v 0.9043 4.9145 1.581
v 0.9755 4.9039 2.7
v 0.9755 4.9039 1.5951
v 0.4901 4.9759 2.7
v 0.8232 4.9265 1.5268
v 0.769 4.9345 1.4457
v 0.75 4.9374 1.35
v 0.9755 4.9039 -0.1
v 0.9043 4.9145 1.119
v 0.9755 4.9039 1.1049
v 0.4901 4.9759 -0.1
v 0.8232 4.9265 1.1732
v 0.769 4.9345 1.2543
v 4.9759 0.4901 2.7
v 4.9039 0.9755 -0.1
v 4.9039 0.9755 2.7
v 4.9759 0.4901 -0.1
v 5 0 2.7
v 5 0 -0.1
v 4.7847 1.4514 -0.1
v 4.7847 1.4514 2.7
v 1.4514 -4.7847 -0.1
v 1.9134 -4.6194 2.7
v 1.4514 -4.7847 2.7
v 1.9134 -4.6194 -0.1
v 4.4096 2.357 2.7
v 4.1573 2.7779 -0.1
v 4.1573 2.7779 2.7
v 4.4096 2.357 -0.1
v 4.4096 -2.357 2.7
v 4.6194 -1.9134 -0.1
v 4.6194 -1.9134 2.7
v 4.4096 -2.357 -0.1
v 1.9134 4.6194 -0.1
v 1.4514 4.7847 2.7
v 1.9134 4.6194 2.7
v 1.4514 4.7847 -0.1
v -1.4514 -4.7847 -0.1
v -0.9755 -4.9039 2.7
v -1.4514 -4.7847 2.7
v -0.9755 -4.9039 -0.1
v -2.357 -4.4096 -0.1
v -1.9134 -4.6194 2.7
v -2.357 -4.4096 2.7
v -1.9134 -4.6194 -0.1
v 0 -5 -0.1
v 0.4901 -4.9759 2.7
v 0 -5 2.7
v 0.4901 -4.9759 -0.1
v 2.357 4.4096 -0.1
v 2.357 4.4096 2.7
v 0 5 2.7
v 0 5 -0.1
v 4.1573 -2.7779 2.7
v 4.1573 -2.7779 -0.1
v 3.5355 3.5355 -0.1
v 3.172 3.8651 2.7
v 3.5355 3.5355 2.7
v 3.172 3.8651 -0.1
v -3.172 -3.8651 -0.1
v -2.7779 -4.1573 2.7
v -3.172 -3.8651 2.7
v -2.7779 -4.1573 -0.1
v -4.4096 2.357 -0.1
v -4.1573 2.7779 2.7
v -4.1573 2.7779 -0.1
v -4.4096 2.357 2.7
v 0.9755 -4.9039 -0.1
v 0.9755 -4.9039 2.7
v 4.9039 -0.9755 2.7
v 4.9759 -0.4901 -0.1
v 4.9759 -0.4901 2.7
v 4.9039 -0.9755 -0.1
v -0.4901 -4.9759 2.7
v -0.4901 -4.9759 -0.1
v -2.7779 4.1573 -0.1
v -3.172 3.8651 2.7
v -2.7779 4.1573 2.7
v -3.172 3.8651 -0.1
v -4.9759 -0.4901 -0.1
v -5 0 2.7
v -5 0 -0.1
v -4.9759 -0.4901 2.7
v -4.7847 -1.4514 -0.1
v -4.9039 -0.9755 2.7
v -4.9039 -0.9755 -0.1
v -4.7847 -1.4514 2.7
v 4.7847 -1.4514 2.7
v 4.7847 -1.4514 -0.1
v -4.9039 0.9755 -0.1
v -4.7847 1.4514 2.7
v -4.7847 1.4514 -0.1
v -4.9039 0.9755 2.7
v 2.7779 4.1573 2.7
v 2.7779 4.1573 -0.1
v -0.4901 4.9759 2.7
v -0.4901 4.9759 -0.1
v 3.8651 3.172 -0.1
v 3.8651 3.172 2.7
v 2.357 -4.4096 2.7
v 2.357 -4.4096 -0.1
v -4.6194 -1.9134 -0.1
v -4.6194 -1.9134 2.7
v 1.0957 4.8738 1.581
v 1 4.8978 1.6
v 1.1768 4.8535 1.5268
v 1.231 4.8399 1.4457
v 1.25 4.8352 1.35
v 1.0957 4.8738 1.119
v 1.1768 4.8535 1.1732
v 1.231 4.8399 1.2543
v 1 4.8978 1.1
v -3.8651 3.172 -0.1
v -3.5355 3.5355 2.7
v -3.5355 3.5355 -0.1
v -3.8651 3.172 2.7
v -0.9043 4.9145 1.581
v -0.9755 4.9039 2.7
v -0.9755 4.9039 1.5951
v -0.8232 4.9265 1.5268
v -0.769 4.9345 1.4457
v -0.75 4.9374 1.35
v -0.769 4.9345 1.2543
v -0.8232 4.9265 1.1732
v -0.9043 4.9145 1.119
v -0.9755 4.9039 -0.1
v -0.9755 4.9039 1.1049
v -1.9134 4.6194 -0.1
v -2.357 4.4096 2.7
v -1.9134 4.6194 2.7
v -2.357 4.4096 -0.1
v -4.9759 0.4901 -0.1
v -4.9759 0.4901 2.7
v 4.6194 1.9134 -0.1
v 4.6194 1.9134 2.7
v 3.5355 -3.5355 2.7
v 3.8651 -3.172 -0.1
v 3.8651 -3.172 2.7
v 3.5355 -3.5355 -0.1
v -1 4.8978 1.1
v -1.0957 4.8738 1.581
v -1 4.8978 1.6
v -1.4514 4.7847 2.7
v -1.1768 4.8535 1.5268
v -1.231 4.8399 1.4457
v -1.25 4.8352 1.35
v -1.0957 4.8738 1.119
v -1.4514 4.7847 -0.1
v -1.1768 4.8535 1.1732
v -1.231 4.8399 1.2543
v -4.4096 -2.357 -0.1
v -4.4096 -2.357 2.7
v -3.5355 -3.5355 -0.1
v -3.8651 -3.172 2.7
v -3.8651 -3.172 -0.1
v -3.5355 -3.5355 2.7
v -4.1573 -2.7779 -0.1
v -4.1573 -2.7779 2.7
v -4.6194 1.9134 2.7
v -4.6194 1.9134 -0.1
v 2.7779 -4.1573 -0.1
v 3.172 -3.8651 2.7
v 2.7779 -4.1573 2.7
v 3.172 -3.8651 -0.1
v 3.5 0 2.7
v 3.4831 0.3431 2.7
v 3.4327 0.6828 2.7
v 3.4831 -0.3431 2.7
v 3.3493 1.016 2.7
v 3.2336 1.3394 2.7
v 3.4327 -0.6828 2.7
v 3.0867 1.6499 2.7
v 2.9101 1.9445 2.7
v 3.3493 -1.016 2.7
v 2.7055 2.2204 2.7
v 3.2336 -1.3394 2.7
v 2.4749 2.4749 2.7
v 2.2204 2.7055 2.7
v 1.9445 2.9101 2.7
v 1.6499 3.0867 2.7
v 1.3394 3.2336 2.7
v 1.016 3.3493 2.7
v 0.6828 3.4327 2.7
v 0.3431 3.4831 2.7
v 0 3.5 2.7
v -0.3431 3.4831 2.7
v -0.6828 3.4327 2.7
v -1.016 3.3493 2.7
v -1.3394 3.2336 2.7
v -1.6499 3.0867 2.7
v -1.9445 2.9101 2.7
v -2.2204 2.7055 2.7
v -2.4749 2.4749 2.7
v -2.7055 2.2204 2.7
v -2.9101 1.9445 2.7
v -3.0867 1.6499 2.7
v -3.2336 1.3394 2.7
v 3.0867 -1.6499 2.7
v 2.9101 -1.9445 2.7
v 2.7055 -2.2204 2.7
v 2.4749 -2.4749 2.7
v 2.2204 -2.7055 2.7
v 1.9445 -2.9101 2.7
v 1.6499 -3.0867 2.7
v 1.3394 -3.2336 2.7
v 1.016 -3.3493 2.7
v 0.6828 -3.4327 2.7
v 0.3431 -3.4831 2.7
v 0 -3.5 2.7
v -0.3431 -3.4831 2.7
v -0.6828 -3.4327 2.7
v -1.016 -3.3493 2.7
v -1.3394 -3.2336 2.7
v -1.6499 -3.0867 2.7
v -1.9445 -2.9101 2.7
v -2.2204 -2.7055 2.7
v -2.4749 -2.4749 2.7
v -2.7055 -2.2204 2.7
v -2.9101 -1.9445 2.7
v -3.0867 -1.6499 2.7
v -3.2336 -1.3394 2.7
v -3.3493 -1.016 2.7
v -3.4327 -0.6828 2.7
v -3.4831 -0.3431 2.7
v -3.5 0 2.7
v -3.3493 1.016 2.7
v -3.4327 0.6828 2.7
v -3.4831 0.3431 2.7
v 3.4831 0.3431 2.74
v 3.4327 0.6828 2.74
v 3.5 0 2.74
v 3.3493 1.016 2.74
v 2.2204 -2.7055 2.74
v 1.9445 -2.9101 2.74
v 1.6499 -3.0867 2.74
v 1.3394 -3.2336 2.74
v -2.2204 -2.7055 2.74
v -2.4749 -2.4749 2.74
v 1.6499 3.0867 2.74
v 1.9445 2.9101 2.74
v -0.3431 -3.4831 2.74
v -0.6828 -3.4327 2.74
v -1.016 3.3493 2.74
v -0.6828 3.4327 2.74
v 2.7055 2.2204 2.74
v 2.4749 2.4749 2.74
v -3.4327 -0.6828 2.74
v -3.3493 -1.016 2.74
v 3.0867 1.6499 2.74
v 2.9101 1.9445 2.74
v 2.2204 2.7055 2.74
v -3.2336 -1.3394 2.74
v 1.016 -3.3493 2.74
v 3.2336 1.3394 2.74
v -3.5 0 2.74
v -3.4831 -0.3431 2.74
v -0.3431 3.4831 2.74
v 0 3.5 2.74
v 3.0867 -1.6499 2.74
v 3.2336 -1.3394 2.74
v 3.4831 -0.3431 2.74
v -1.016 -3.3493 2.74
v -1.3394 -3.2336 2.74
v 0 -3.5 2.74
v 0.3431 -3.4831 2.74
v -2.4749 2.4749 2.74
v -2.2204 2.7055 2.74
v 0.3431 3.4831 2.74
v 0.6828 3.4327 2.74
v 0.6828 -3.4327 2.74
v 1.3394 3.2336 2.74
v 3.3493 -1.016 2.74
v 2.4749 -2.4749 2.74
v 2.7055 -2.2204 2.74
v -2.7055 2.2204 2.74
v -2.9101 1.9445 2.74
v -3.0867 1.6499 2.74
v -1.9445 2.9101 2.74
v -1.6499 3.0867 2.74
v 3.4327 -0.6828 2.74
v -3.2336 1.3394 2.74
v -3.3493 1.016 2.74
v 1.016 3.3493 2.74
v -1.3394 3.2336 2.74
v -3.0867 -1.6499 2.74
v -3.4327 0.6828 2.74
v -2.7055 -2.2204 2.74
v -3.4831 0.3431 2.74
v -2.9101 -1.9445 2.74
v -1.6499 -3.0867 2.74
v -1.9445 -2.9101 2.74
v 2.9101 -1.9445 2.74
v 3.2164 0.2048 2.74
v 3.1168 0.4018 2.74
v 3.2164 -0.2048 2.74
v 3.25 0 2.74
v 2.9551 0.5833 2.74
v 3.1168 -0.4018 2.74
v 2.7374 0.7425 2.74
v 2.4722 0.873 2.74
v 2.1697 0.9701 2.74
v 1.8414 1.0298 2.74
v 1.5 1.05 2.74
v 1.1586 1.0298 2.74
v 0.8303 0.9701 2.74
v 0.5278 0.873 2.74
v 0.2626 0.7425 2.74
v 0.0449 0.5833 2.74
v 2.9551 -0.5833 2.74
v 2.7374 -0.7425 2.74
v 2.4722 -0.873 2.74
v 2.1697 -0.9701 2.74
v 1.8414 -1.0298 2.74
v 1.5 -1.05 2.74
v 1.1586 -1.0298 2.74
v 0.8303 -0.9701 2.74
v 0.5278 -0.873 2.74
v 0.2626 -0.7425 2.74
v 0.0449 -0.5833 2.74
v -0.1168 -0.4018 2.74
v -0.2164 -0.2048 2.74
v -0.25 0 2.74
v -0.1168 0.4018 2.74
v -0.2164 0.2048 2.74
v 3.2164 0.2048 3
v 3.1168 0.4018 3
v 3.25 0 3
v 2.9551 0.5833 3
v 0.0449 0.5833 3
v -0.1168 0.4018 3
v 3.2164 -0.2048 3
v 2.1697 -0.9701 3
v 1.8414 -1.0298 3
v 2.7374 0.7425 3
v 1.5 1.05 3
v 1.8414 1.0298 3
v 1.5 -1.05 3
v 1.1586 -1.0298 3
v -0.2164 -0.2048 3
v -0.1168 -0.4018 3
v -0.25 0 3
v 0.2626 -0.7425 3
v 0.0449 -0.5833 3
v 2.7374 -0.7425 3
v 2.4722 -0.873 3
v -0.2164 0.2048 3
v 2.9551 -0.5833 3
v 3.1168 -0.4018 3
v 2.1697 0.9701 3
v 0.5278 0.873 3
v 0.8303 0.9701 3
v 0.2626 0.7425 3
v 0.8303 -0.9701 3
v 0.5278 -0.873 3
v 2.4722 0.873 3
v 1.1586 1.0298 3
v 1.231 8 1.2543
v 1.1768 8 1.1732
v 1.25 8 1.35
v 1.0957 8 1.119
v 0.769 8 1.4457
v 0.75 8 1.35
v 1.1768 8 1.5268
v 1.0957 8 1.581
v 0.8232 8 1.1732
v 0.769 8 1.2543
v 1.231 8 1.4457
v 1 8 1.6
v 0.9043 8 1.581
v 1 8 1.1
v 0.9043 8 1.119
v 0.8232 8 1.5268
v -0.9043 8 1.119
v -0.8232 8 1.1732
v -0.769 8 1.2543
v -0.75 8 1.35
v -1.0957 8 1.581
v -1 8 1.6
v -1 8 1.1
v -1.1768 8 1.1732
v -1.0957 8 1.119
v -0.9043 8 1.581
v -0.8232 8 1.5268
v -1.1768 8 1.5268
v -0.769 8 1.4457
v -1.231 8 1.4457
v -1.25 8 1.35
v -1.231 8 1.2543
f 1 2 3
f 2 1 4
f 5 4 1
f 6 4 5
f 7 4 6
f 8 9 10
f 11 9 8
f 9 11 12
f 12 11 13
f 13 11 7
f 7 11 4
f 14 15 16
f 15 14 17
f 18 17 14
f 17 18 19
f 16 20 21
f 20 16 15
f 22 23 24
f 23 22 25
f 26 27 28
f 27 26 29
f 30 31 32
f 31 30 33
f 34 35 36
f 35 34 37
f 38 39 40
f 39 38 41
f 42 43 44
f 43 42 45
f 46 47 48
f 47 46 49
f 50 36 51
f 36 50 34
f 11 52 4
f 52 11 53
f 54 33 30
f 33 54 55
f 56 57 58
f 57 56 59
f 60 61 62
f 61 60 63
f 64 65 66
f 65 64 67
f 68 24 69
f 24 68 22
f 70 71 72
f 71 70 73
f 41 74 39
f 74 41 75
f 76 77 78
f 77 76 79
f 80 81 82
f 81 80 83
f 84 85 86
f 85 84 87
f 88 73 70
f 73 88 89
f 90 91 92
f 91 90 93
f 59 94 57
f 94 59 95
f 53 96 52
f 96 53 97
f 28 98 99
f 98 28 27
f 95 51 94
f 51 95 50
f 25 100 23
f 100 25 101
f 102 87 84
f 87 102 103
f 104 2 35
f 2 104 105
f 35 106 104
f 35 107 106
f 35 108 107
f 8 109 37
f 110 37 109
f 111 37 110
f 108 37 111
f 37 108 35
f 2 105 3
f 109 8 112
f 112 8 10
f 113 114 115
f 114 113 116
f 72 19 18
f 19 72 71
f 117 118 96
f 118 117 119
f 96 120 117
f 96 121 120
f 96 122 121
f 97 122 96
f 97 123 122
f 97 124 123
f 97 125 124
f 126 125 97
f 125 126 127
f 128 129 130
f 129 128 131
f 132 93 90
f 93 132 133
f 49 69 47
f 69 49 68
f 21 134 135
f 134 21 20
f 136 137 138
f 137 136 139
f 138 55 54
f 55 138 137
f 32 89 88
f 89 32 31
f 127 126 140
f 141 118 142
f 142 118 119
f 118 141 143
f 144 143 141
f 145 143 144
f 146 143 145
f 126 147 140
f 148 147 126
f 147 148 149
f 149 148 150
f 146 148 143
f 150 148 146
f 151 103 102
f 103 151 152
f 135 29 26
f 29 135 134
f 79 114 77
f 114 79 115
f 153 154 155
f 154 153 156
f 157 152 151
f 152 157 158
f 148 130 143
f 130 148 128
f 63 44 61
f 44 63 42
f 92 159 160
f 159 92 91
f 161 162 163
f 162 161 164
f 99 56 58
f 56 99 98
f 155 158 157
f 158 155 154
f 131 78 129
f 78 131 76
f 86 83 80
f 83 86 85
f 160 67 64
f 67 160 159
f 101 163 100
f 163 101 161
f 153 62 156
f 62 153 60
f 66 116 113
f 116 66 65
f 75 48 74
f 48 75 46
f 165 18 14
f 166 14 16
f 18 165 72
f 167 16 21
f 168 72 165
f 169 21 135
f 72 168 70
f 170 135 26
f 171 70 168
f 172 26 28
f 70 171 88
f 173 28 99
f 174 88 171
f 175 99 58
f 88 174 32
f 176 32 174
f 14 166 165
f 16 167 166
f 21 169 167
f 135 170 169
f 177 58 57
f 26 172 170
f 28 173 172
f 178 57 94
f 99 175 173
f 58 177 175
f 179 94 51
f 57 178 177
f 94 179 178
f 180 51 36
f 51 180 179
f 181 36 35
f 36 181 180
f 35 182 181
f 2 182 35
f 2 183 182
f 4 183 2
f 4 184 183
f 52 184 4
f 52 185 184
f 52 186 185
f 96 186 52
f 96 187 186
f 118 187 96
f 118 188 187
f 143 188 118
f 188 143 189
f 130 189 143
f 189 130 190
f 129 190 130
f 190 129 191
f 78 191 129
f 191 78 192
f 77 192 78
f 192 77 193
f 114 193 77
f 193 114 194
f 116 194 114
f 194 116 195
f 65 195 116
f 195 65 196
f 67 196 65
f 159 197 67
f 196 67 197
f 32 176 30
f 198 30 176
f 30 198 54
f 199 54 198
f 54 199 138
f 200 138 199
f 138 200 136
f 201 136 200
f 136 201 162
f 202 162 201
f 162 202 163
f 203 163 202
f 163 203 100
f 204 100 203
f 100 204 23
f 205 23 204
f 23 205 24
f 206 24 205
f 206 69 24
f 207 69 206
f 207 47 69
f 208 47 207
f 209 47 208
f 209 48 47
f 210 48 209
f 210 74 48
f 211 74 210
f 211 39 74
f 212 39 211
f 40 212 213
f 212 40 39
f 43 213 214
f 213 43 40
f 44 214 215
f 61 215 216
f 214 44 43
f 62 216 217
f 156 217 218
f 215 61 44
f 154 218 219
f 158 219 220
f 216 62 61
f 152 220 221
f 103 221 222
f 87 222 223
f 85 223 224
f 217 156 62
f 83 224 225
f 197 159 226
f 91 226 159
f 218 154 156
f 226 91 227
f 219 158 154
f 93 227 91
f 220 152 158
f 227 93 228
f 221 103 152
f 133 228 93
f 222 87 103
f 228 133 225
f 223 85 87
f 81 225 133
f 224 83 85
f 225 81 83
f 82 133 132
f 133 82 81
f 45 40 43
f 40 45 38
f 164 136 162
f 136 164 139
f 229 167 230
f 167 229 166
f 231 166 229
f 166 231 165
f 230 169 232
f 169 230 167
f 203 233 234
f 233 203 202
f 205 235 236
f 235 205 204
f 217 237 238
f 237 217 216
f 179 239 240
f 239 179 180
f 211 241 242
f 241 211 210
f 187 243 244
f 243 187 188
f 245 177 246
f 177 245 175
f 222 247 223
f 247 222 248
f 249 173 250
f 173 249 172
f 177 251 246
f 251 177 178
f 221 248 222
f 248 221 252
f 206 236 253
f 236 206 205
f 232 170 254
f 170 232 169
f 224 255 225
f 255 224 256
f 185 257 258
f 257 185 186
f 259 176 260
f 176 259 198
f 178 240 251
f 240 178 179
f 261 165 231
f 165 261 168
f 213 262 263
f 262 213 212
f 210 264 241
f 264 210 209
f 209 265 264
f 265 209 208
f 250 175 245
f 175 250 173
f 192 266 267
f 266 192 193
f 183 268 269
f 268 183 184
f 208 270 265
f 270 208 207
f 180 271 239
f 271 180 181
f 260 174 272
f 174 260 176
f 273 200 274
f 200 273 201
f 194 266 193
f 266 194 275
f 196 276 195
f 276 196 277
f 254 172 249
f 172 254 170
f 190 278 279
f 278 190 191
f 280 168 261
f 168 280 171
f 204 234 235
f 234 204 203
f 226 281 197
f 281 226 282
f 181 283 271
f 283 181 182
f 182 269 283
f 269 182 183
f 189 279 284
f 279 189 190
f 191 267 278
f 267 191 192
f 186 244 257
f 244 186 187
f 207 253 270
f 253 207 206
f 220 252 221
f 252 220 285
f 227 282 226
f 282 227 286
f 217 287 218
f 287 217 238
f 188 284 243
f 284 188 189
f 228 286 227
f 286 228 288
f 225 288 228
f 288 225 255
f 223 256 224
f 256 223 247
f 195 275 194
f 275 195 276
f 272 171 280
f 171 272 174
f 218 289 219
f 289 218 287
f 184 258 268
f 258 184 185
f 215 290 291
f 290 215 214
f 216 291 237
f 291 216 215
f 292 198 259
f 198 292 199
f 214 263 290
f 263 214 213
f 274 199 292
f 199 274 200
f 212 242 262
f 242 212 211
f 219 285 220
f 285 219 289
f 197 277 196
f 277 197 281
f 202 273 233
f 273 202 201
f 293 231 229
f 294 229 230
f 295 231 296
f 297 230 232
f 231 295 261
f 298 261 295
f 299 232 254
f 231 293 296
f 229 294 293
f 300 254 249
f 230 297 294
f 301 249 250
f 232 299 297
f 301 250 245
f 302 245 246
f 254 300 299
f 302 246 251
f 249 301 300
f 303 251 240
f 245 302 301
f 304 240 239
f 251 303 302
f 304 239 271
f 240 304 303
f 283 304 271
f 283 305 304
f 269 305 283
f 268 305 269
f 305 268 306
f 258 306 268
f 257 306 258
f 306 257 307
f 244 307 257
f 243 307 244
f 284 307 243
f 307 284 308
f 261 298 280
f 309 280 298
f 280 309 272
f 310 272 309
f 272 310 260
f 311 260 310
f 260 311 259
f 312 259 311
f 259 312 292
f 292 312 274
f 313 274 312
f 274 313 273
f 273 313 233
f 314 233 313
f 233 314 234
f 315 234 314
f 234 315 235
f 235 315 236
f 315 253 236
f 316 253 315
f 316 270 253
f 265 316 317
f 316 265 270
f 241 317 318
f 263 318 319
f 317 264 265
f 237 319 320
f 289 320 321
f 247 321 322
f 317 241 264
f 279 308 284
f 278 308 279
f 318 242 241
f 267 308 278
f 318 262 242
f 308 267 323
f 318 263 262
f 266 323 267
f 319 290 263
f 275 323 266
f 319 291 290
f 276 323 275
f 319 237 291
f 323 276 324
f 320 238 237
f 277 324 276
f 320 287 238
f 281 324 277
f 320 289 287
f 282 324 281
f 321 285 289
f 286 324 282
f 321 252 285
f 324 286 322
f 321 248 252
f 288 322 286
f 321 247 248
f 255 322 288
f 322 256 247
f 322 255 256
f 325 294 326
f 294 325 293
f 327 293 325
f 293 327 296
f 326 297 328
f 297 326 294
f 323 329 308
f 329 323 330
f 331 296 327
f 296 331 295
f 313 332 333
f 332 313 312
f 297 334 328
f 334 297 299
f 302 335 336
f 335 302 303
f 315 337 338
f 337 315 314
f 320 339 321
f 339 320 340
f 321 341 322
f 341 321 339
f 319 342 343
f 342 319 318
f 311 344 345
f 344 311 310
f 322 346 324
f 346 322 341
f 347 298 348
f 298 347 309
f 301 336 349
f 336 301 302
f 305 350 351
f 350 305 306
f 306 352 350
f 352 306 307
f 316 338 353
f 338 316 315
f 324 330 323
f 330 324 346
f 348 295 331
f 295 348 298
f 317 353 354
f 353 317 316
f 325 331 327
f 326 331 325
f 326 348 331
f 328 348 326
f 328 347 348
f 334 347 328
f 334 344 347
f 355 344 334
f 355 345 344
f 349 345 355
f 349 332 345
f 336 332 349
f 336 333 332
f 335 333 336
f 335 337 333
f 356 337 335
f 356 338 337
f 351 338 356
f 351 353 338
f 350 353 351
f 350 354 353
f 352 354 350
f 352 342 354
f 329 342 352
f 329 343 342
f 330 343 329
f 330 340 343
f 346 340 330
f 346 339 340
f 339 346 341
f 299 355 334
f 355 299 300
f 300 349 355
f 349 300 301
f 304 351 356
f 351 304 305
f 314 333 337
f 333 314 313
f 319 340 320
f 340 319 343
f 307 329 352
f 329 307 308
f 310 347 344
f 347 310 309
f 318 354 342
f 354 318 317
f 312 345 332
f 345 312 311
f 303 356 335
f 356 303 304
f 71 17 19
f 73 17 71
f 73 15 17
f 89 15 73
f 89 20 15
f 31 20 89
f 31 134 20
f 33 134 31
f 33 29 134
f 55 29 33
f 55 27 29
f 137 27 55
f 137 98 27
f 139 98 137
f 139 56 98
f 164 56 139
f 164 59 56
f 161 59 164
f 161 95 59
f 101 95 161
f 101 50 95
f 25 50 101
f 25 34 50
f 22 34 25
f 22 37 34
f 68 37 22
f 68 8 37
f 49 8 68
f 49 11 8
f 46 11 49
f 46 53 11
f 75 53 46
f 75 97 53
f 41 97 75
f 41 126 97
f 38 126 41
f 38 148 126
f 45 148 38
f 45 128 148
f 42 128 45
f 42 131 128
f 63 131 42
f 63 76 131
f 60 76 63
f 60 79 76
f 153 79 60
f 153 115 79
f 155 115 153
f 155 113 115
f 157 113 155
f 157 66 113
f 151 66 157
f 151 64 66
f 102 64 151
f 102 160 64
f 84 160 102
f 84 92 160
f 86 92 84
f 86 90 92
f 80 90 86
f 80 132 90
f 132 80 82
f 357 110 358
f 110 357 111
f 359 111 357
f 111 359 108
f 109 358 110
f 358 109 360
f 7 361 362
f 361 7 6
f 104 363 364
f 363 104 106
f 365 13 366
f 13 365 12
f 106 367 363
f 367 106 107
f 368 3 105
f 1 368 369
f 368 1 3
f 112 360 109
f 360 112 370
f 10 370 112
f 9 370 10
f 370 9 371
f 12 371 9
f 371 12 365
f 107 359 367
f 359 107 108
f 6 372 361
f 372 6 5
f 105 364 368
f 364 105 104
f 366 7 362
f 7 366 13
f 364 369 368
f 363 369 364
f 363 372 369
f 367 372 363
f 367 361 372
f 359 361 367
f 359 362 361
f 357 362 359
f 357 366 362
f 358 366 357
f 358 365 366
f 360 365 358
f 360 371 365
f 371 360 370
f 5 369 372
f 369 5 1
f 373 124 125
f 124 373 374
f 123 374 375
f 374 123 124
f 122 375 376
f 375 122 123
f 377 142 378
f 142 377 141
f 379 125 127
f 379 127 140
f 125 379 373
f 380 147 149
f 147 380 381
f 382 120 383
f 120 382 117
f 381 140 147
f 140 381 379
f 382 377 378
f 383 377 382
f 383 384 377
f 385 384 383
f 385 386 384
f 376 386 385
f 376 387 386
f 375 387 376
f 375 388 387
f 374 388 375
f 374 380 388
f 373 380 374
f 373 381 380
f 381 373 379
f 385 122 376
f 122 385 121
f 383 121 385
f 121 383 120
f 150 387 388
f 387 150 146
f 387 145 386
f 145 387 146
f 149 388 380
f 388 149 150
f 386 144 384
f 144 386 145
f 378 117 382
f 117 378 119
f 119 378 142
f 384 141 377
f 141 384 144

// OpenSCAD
// =============================================================================
// InkTime Smartwatch - Shaker/Vibration Motor 3D Model
// Component: DFRobot FIT0774 Coin Vibration Motor
// Dimensions: Diameter 10 mm, Thickness 2.7 mm
// Specifications: DC 1.5-4.2V, Rated 3V/50mA, 11000±2500 RPM
// =============================================================================

module shaker_FIT0774() {
    // Motor dimensions (mm)
    diameter  = 10.0;
    radius    = diameter / 2;
    thickness = 2.7;
    
    // Wire dimensions
    wire_length  = 12.0;
    wire_radius  = 0.25;
    wire_spacing = 2.0;
    
    // --- Main motor body (cylindrical coin motor) ---
    color("Silver", 0.9)
    cylinder(h=thickness, r=radius, $fn=64);
    
    // --- Top label/marking circle ---
    color("DimGray", 0.6)
    translate([0, 0, thickness - 0.01])
    cylinder(h=0.05, r=radius * 0.7, $fn=64);
    
    // --- Eccentric weight (visible as a bump on top) ---
    color("Copper")
    translate([radius * 0.3, 0, thickness])
    scale([1, 0.6, 1])
    cylinder(h=0.3, r=radius * 0.35, $fn=32);
    
    // --- Thin adhesive backing ---
    color("White", 0.5)
    translate([0, 0, -0.1])
    cylinder(h=0.1, r=radius, $fn=64);
    
    // --- Wire leads ---
    // Positive (red)
    color("Red")
    translate([wire_spacing/2, -radius + 1, thickness/2])
    rotate([-90, 0, 0])
    cylinder(h=wire_length, r=wire_radius, $fn=16);
    
    // Negative (blue/black)
    color("Blue")
    translate([-wire_spacing/2, -radius + 1, thickness/2])
    rotate([-90, 0, 0])
    cylinder(h=wire_length, r=wire_radius, $fn=16);
}

// Render the shaker motor
shaker_FIT0774();
